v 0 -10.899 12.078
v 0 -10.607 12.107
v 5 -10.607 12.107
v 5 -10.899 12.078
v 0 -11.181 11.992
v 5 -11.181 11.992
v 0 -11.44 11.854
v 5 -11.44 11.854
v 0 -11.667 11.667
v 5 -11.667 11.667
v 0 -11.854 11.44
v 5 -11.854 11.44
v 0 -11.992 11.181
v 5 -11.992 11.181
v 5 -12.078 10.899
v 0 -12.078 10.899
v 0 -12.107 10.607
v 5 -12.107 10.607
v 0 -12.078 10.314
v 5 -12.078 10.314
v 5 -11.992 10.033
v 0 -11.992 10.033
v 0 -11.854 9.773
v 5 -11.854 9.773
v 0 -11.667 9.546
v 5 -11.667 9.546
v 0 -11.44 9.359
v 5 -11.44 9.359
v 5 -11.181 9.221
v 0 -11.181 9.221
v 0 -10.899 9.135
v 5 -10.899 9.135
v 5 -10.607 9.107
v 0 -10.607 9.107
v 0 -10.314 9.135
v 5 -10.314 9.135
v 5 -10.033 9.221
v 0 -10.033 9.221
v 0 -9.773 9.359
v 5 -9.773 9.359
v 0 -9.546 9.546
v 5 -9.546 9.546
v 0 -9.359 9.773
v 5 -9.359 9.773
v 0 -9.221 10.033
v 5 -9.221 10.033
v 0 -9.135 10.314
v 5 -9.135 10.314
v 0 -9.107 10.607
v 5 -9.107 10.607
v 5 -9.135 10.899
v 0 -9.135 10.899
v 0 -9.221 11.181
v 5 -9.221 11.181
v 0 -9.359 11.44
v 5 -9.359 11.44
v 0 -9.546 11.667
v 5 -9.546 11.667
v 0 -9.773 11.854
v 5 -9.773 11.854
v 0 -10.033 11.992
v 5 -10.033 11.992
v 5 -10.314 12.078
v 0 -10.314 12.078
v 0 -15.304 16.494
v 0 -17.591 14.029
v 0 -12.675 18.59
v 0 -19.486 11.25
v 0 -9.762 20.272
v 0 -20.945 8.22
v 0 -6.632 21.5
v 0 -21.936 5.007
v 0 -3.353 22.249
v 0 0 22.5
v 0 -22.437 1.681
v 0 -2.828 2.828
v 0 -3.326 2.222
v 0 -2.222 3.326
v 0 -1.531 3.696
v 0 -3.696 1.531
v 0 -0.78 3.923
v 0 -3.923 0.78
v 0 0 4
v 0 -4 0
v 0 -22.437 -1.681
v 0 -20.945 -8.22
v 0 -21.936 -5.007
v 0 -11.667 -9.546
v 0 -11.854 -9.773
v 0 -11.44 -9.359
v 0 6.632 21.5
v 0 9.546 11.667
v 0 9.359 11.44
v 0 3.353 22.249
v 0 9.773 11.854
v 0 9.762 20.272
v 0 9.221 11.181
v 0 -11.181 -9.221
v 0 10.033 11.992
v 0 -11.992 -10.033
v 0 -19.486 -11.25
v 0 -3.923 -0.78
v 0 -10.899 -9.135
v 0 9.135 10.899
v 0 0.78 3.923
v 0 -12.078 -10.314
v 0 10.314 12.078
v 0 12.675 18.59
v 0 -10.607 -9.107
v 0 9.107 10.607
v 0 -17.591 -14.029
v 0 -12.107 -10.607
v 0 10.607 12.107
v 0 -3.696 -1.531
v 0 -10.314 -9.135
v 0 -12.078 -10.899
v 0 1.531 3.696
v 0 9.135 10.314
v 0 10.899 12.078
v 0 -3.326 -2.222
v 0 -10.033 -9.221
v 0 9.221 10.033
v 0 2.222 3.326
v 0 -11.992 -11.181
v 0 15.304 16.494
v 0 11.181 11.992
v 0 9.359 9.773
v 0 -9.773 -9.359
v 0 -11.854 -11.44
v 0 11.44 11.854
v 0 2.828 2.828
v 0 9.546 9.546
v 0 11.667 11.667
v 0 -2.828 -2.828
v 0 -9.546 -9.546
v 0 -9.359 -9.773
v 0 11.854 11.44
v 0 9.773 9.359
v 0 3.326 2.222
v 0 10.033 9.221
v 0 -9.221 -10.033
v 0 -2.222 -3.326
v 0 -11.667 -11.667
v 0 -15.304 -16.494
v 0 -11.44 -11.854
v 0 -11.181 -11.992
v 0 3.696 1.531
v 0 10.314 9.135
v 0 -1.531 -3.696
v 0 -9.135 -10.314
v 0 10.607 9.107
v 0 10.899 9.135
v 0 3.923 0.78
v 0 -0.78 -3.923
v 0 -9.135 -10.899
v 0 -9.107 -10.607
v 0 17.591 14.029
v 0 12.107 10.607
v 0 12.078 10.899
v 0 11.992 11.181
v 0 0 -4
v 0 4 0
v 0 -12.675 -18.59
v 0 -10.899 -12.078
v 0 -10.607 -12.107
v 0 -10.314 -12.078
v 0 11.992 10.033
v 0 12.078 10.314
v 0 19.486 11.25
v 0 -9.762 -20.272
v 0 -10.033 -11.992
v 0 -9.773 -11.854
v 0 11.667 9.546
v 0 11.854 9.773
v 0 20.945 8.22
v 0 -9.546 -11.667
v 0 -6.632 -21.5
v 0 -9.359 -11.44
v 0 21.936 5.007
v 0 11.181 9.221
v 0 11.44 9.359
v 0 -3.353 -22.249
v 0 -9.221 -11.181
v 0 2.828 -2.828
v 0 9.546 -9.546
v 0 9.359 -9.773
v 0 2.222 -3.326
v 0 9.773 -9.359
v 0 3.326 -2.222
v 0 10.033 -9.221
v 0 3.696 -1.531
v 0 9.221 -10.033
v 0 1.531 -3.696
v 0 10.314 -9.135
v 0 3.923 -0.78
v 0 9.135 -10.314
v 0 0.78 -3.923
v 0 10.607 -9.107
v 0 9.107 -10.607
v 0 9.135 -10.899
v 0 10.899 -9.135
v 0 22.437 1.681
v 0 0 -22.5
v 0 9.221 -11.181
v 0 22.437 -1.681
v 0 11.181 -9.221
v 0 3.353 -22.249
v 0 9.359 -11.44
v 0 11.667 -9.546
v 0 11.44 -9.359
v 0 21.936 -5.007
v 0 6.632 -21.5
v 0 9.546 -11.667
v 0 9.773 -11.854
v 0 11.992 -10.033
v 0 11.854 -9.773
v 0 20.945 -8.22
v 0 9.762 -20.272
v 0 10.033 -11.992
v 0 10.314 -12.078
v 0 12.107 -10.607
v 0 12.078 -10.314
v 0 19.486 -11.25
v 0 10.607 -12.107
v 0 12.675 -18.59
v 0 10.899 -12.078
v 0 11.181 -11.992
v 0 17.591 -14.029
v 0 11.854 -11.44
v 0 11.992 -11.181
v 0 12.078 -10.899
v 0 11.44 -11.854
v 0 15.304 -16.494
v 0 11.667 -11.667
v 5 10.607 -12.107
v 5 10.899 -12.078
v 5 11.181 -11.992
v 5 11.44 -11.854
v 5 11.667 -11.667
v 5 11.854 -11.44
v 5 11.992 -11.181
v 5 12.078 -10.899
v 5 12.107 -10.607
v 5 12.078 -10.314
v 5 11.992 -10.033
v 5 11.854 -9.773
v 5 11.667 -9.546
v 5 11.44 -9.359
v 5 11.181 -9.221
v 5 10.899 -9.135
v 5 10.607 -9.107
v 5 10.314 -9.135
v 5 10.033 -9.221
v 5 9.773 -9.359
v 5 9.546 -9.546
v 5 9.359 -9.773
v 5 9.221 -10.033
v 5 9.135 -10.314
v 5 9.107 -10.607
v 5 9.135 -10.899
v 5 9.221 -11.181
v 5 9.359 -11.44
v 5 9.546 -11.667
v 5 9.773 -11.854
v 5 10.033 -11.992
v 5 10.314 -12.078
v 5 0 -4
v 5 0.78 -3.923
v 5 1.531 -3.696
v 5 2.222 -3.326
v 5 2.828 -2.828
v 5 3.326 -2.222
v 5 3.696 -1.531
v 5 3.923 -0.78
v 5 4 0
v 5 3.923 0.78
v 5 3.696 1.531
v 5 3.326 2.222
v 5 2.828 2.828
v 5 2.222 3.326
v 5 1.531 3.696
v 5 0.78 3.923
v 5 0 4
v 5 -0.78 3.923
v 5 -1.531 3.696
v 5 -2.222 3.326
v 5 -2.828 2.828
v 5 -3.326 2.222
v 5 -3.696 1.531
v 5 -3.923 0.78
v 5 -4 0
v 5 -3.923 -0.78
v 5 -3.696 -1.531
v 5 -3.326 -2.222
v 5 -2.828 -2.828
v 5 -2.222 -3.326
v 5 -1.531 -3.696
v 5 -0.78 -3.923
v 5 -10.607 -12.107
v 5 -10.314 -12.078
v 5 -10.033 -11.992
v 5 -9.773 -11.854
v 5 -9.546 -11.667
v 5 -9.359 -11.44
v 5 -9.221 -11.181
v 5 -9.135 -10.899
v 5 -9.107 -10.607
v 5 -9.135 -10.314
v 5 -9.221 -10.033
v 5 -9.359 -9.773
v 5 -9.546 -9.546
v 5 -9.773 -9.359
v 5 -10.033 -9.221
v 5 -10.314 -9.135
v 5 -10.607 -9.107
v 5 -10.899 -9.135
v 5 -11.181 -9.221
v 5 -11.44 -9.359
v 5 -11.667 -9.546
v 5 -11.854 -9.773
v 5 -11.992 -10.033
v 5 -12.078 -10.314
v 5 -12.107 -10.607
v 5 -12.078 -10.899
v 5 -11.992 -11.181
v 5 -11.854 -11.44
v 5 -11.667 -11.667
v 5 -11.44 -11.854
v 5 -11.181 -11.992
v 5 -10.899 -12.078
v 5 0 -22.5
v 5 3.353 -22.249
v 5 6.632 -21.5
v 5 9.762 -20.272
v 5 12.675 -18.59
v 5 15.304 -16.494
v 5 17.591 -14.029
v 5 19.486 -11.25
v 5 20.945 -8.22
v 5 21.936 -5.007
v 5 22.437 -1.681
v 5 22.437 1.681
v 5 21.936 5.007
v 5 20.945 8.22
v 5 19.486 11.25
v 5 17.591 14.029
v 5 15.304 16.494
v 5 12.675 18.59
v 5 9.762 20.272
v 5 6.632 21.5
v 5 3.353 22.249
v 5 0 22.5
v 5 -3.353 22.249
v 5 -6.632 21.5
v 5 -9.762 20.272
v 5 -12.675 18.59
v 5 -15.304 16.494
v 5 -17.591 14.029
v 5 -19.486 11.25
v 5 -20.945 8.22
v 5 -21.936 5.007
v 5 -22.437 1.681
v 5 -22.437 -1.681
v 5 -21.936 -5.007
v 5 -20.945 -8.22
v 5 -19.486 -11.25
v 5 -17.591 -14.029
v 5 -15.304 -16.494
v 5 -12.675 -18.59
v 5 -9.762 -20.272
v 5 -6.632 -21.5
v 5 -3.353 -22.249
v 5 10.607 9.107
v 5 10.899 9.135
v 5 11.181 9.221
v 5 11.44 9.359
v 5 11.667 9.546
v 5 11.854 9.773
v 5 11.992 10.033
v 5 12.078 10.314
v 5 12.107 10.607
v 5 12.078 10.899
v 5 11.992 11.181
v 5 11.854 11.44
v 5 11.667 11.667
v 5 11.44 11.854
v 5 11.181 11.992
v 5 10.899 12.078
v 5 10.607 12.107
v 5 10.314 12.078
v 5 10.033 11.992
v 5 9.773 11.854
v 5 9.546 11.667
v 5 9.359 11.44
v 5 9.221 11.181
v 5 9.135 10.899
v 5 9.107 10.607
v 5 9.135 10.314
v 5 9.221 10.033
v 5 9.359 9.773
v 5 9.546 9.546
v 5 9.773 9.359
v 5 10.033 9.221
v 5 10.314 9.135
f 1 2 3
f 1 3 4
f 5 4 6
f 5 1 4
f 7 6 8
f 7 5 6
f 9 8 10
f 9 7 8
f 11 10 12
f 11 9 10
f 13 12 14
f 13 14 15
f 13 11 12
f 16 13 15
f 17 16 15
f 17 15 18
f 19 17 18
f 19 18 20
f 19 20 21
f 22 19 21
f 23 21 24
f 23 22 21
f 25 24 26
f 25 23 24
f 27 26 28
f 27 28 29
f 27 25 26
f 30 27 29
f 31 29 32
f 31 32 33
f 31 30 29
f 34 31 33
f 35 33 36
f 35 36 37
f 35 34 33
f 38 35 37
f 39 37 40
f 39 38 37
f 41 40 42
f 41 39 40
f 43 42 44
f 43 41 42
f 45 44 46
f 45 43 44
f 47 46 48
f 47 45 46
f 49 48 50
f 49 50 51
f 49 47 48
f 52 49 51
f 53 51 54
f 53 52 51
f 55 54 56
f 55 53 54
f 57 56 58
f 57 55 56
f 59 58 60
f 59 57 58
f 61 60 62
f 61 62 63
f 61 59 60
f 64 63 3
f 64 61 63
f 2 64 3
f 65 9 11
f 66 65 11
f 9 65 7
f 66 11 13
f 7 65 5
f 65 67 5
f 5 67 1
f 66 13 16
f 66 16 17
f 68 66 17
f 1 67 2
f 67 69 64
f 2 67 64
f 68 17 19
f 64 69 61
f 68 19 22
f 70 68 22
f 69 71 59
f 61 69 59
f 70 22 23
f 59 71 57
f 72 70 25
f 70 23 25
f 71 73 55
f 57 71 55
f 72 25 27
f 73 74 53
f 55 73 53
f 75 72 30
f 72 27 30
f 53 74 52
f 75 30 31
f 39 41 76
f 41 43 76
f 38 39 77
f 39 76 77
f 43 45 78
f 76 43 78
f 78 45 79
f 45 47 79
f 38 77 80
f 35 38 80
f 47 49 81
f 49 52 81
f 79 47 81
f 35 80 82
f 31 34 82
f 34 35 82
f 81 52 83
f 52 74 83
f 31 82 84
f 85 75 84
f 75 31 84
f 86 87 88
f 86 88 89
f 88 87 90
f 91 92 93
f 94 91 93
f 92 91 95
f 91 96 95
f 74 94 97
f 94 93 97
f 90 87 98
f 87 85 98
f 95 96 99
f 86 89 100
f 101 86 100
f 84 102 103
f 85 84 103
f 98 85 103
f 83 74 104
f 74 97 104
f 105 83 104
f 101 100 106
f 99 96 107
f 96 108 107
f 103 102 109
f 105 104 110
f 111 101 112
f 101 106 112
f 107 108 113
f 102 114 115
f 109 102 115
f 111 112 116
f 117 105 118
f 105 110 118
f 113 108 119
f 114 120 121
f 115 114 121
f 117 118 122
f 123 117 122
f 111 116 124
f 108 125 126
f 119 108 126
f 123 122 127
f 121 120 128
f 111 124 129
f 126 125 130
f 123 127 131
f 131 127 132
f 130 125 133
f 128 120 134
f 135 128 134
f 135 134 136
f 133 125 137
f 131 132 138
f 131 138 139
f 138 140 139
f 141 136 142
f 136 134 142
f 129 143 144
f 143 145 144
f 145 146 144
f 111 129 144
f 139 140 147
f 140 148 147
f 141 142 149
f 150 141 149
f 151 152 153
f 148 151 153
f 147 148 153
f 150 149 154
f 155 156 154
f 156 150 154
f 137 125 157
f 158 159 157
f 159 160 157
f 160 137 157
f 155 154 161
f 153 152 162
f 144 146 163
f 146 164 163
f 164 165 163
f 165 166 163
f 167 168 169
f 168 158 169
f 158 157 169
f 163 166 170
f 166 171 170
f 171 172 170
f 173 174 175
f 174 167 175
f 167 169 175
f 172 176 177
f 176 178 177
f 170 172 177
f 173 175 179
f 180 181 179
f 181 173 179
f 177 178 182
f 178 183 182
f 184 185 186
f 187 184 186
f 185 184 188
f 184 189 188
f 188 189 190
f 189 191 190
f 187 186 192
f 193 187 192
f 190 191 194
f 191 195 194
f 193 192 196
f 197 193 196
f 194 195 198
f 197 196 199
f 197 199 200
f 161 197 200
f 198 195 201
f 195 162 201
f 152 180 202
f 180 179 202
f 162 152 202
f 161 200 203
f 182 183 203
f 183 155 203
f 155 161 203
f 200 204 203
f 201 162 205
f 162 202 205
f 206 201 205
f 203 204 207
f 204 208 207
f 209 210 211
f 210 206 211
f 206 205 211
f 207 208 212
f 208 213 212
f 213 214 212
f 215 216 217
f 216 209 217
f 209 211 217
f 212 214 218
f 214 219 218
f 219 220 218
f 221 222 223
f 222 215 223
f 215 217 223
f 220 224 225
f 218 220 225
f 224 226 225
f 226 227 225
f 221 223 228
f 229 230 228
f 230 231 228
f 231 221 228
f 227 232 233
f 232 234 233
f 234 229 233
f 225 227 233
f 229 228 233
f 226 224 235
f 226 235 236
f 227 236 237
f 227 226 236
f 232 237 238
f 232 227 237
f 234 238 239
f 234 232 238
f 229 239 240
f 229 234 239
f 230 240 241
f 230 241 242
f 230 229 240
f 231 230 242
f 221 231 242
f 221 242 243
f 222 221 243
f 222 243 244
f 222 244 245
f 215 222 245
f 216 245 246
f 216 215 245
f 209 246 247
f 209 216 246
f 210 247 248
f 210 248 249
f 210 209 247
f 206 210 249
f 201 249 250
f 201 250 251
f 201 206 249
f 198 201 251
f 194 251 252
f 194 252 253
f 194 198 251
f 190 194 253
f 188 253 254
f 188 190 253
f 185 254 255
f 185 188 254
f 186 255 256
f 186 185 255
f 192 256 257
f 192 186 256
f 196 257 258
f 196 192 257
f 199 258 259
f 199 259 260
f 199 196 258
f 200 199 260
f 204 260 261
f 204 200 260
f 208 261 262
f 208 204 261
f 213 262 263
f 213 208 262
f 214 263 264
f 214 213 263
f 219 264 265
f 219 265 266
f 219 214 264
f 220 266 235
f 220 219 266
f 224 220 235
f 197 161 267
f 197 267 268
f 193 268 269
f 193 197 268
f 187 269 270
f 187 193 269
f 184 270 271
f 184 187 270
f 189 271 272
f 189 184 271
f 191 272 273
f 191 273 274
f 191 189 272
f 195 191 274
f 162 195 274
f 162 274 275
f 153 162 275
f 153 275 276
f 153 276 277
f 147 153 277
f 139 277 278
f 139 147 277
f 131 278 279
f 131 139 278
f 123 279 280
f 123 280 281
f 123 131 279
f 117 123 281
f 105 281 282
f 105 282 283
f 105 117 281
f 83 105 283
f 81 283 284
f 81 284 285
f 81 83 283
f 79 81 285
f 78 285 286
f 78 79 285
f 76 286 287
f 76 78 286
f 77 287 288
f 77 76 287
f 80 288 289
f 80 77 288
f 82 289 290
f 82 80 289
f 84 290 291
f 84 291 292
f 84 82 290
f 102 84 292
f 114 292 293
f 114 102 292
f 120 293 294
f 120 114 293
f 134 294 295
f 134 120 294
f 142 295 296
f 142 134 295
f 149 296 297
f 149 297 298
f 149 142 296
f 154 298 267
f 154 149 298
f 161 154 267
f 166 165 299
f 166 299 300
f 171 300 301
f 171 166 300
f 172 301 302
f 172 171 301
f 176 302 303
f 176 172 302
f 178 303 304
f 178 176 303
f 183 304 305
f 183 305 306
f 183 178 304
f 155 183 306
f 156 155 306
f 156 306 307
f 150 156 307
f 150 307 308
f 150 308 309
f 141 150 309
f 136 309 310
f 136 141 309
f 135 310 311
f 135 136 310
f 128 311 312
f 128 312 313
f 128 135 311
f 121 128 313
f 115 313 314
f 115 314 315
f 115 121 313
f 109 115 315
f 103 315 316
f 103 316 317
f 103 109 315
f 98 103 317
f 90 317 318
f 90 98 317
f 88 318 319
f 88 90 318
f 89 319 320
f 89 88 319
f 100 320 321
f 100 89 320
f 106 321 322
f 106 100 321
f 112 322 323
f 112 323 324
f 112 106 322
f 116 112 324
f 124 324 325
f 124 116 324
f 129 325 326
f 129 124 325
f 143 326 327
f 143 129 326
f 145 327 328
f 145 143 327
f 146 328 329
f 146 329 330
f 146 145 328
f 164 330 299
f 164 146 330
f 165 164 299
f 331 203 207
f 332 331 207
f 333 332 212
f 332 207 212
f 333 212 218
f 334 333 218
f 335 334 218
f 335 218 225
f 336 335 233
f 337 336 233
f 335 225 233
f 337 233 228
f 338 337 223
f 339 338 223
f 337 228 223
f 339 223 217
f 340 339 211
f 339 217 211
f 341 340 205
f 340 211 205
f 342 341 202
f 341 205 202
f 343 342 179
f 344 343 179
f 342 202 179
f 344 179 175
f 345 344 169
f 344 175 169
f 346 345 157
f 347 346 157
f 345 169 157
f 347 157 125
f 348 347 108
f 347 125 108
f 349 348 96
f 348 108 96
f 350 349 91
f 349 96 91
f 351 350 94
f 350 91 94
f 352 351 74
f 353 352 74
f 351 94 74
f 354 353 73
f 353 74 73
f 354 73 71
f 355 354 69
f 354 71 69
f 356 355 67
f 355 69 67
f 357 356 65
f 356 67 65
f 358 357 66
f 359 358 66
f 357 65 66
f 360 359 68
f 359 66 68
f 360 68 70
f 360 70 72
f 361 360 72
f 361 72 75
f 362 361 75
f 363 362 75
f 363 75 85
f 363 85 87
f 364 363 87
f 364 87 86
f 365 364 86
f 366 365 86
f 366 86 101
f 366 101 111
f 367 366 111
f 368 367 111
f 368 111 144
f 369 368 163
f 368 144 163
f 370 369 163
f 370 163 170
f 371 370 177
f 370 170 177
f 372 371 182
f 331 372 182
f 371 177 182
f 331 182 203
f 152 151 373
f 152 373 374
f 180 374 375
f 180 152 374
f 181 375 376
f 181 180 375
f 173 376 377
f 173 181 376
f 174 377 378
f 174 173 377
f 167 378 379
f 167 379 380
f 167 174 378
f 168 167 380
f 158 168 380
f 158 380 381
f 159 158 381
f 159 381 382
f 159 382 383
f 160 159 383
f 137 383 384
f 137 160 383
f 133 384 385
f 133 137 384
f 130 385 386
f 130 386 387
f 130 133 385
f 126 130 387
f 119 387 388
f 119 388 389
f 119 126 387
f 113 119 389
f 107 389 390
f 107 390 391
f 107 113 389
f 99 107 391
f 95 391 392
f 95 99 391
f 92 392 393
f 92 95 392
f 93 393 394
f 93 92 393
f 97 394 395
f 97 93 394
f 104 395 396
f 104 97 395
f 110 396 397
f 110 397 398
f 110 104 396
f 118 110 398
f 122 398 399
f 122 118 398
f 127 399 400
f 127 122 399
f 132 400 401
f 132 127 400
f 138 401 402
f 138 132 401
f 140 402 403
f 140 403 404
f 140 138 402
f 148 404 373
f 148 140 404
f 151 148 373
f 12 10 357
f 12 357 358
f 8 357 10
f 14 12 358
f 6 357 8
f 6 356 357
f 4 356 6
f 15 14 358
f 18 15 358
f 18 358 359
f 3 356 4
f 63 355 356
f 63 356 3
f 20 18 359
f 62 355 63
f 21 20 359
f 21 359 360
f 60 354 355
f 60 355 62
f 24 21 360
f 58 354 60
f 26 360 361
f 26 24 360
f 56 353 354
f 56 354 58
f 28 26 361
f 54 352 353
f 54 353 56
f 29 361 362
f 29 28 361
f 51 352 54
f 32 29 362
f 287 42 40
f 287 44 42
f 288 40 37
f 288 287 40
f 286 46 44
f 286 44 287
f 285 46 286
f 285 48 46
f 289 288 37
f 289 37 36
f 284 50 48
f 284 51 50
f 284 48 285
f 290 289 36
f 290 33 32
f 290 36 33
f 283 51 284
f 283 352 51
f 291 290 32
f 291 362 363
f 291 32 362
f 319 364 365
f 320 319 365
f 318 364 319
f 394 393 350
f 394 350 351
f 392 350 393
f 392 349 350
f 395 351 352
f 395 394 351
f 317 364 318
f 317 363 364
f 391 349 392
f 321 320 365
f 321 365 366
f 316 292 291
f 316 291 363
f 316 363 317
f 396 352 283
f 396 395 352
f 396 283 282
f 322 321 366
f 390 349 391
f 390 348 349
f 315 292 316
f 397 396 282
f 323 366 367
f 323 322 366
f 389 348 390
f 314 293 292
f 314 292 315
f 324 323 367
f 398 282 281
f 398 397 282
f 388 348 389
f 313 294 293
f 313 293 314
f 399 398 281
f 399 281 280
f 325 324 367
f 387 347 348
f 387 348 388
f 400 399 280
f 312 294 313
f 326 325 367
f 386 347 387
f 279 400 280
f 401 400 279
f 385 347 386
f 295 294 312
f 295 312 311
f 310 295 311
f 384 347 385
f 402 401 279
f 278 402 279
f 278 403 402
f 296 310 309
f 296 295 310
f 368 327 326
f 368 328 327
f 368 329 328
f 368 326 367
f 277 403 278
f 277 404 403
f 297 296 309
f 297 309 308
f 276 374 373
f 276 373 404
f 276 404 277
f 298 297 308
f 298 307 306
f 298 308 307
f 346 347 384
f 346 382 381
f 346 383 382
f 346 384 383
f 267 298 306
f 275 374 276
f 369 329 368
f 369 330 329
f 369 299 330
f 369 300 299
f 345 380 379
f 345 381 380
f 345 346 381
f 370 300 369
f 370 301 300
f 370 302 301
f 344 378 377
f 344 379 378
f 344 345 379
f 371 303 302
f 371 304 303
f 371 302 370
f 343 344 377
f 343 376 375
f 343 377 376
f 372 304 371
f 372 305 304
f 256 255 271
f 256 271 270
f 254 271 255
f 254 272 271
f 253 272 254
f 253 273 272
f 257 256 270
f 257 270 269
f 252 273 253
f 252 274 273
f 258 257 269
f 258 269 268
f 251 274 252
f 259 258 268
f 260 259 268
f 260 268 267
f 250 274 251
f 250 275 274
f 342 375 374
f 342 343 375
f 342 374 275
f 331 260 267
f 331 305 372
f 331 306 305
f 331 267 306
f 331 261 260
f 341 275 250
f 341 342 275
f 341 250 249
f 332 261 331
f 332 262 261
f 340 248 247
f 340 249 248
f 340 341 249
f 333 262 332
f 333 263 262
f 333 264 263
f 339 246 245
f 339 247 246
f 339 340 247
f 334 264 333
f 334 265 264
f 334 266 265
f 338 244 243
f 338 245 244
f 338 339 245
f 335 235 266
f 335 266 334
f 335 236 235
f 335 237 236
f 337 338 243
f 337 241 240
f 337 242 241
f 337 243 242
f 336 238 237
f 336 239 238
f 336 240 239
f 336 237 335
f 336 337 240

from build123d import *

# Parameters (mm, degrees)
SKETCH1_R           = 22.5
SKETCH1_R_2         = 4
SKETCH1_R_3         = 1.5
BOSS_EXTRUDE1_DEPTH = 5


with BuildPart() as part:
    # Sketch1 → Boss-Extrude1 (new body)
    with BuildSketch(Plane(origin=(0, 0, 0), x_dir=(0, 0, -1), z_dir=(1, 0, 0))):
        Circle(SKETCH1_R)
        Circle(SKETCH1_R_2, mode=Mode.SUBTRACT)
        with Locations((-10.606601718, 10.606601718)):
            Circle(SKETCH1_R_3, mode=Mode.SUBTRACT)
        with Locations(Location((-10.606601718, -10.606601718, 0), (0, 0, 180))):
            Circle(SKETCH1_R_3, mode=Mode.SUBTRACT)
        with Locations((10.606601718, -10.606601718)):
            Circle(SKETCH1_R_3, mode=Mode.SUBTRACT)
        with Locations((10.606601718, 10.606601718)):
            Circle(SKETCH1_R_3, mode=Mode.SUBTRACT)
    extrude(amount=BOSS_EXTRUDE1_DEPTH)


solid = part.part
